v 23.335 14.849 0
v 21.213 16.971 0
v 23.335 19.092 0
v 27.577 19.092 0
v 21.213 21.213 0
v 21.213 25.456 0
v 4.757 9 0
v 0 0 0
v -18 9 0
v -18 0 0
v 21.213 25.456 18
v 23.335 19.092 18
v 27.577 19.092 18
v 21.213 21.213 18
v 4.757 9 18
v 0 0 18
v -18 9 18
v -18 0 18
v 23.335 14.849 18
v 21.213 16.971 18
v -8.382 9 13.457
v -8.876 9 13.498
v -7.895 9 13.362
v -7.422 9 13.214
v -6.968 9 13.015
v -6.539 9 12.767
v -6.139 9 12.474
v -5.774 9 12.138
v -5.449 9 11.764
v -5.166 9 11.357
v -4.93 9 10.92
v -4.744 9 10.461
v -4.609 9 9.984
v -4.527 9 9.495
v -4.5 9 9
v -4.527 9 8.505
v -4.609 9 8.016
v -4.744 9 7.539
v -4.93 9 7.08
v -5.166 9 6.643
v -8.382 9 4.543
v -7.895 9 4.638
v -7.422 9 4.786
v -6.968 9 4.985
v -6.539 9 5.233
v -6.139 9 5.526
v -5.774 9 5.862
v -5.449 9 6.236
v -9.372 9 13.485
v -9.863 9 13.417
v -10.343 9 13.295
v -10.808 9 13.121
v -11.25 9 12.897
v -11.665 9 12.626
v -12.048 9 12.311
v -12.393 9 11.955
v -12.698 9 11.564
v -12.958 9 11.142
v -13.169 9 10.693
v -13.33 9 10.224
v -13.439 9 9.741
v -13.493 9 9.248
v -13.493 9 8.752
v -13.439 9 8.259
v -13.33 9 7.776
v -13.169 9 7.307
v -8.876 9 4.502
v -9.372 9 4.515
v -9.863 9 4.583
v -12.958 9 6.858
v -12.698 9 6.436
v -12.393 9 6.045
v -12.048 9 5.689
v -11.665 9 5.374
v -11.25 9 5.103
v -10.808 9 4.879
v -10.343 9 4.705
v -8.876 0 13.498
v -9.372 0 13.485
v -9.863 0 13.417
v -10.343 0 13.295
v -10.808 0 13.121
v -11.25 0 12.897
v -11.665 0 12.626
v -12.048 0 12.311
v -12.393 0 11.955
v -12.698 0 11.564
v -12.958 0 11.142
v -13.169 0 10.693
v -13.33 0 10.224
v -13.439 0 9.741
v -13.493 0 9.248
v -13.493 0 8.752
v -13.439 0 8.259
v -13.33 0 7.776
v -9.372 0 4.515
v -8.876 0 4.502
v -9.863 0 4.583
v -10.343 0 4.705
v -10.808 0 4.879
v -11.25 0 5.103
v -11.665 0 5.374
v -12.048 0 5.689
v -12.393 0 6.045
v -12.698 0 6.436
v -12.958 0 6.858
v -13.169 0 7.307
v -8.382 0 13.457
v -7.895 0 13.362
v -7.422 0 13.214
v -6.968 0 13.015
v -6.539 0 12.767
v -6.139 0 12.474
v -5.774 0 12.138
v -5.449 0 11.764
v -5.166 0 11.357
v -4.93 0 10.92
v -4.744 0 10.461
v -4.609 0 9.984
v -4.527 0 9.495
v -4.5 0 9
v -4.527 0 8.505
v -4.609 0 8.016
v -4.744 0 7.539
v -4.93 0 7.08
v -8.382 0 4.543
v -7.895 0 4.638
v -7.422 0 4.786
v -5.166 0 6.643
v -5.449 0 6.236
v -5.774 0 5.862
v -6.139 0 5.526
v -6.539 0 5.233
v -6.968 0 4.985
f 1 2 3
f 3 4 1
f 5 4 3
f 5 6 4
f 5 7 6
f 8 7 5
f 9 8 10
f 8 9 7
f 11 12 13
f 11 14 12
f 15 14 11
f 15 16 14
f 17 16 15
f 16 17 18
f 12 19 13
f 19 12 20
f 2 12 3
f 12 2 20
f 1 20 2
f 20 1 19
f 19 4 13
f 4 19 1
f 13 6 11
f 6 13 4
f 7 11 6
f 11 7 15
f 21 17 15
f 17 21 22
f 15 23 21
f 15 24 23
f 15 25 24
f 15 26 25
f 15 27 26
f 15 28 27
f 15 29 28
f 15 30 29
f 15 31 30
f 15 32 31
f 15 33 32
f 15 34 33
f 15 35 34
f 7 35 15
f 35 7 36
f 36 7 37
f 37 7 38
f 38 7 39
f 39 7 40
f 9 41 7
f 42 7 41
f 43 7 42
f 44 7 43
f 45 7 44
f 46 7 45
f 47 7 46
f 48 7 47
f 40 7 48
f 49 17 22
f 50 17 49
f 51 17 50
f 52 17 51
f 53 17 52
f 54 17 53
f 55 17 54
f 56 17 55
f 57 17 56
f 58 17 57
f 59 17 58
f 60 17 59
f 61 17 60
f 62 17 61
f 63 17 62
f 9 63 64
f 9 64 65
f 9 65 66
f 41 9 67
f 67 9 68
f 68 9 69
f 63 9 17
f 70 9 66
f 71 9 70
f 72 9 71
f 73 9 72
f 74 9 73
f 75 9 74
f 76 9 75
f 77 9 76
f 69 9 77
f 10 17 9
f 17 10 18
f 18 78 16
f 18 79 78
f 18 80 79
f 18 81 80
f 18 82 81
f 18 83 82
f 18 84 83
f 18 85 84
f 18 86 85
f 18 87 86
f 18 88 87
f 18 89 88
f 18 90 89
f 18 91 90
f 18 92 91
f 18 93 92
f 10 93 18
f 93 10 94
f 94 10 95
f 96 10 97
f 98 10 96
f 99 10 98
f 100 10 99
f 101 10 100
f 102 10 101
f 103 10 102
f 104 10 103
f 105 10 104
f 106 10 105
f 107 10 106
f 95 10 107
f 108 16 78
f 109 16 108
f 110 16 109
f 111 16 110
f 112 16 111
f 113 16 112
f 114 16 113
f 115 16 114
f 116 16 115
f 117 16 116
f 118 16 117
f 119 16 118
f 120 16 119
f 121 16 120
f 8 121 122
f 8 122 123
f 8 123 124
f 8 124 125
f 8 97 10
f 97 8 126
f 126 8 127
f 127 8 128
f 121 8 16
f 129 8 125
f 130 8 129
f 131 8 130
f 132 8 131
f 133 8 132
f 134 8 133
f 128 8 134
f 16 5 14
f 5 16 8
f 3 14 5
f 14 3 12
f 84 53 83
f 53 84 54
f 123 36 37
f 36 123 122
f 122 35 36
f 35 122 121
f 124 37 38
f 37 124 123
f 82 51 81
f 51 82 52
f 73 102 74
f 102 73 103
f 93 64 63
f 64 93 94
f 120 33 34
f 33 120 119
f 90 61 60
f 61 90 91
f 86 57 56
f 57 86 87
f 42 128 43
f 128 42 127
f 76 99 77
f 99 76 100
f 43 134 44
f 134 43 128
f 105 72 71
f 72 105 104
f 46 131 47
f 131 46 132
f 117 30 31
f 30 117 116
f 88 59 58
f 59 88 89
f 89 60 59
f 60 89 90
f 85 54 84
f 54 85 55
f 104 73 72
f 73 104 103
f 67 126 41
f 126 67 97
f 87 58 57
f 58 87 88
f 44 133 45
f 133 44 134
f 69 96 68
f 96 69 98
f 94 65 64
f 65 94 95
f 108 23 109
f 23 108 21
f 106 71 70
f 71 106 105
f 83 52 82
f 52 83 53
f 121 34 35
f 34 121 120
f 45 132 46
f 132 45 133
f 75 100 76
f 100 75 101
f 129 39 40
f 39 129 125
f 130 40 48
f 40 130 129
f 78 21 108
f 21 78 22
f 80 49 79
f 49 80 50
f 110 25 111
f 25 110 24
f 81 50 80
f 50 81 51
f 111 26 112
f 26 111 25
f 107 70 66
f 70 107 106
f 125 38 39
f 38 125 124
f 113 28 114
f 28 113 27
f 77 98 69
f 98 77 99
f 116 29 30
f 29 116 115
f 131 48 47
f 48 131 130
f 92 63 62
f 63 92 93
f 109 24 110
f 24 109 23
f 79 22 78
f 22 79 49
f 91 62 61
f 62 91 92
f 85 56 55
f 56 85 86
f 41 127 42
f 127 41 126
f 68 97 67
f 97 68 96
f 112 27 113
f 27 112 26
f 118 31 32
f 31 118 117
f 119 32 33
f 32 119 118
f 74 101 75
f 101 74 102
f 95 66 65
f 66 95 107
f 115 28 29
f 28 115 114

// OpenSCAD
//a half of holder of L-profiles at 45 degrees
//Project: diy slider rail for diy dolly
$fa=1;
$fs=0.5;
part="rail_holder"; //[rail_holder,tripod_mount]
wall=3;
rod=9;
rod_distance=50;
thickness=3;
side=30;
screw=4;
bissl=0.01;
module rail_holder() {
  difference() {
    linear_extrude(2*rod,convexity=5) {
      rotate(45) {
        square([side,wall]);
        translate([side,-wall-thickness])square([wall,2*wall+thickness]);
        translate([side-wall,-wall-thickness])square([wall,wall]);
      }
      polygon([[0,0],[-2*rod,0],[-2*rod,rod],[rod,rod]]);
    }
    translate([-rod,-bissl,rod])rotate([-90,0,0])cylinder(d=rod,h=rod+2*bissl);
  }
}
module tripod_mount() {
  thick=rod/2+wall;
  size=rod+2*wall+rod_distance;
  difference() {
    translate([-size/2,-size/2,0])cube([size,size,thick]);
    translate([0,-rod_distance/2,thick])rotate([0,90,0])cylinder(d=rod,h=size+bissl,center=true);
    translate([0,rod_distance/2,thick])rotate([0,90,0])cylinder(d=rod,h=size+bissl,center=true);
    translate([0,0,thick-3])cylinder(d=14,h=3+bissl,$fn=6);
    translate([0,0,-bissl])cylinder(d=8,h=thick);
    translate([0,0,-bissl])for(t=[[wall+screw/2-size/2,rod+2*wall+screw/2-size/2],[wall+screw/2-size/2,size/2-rod-2*wall-screw/2],[size/2-wall-screw/2,rod+2*wall+screw/2-size/2],[size/2-wall-screw/2,size/2-rod-2*wall-screw/2]])
      translate(t)cylinder(d=screw,h=thick+2*bissl);
  }
}
if (part=="rail_holder") rail_holder();
if (part=="tripod_mount") tripod_mount();
